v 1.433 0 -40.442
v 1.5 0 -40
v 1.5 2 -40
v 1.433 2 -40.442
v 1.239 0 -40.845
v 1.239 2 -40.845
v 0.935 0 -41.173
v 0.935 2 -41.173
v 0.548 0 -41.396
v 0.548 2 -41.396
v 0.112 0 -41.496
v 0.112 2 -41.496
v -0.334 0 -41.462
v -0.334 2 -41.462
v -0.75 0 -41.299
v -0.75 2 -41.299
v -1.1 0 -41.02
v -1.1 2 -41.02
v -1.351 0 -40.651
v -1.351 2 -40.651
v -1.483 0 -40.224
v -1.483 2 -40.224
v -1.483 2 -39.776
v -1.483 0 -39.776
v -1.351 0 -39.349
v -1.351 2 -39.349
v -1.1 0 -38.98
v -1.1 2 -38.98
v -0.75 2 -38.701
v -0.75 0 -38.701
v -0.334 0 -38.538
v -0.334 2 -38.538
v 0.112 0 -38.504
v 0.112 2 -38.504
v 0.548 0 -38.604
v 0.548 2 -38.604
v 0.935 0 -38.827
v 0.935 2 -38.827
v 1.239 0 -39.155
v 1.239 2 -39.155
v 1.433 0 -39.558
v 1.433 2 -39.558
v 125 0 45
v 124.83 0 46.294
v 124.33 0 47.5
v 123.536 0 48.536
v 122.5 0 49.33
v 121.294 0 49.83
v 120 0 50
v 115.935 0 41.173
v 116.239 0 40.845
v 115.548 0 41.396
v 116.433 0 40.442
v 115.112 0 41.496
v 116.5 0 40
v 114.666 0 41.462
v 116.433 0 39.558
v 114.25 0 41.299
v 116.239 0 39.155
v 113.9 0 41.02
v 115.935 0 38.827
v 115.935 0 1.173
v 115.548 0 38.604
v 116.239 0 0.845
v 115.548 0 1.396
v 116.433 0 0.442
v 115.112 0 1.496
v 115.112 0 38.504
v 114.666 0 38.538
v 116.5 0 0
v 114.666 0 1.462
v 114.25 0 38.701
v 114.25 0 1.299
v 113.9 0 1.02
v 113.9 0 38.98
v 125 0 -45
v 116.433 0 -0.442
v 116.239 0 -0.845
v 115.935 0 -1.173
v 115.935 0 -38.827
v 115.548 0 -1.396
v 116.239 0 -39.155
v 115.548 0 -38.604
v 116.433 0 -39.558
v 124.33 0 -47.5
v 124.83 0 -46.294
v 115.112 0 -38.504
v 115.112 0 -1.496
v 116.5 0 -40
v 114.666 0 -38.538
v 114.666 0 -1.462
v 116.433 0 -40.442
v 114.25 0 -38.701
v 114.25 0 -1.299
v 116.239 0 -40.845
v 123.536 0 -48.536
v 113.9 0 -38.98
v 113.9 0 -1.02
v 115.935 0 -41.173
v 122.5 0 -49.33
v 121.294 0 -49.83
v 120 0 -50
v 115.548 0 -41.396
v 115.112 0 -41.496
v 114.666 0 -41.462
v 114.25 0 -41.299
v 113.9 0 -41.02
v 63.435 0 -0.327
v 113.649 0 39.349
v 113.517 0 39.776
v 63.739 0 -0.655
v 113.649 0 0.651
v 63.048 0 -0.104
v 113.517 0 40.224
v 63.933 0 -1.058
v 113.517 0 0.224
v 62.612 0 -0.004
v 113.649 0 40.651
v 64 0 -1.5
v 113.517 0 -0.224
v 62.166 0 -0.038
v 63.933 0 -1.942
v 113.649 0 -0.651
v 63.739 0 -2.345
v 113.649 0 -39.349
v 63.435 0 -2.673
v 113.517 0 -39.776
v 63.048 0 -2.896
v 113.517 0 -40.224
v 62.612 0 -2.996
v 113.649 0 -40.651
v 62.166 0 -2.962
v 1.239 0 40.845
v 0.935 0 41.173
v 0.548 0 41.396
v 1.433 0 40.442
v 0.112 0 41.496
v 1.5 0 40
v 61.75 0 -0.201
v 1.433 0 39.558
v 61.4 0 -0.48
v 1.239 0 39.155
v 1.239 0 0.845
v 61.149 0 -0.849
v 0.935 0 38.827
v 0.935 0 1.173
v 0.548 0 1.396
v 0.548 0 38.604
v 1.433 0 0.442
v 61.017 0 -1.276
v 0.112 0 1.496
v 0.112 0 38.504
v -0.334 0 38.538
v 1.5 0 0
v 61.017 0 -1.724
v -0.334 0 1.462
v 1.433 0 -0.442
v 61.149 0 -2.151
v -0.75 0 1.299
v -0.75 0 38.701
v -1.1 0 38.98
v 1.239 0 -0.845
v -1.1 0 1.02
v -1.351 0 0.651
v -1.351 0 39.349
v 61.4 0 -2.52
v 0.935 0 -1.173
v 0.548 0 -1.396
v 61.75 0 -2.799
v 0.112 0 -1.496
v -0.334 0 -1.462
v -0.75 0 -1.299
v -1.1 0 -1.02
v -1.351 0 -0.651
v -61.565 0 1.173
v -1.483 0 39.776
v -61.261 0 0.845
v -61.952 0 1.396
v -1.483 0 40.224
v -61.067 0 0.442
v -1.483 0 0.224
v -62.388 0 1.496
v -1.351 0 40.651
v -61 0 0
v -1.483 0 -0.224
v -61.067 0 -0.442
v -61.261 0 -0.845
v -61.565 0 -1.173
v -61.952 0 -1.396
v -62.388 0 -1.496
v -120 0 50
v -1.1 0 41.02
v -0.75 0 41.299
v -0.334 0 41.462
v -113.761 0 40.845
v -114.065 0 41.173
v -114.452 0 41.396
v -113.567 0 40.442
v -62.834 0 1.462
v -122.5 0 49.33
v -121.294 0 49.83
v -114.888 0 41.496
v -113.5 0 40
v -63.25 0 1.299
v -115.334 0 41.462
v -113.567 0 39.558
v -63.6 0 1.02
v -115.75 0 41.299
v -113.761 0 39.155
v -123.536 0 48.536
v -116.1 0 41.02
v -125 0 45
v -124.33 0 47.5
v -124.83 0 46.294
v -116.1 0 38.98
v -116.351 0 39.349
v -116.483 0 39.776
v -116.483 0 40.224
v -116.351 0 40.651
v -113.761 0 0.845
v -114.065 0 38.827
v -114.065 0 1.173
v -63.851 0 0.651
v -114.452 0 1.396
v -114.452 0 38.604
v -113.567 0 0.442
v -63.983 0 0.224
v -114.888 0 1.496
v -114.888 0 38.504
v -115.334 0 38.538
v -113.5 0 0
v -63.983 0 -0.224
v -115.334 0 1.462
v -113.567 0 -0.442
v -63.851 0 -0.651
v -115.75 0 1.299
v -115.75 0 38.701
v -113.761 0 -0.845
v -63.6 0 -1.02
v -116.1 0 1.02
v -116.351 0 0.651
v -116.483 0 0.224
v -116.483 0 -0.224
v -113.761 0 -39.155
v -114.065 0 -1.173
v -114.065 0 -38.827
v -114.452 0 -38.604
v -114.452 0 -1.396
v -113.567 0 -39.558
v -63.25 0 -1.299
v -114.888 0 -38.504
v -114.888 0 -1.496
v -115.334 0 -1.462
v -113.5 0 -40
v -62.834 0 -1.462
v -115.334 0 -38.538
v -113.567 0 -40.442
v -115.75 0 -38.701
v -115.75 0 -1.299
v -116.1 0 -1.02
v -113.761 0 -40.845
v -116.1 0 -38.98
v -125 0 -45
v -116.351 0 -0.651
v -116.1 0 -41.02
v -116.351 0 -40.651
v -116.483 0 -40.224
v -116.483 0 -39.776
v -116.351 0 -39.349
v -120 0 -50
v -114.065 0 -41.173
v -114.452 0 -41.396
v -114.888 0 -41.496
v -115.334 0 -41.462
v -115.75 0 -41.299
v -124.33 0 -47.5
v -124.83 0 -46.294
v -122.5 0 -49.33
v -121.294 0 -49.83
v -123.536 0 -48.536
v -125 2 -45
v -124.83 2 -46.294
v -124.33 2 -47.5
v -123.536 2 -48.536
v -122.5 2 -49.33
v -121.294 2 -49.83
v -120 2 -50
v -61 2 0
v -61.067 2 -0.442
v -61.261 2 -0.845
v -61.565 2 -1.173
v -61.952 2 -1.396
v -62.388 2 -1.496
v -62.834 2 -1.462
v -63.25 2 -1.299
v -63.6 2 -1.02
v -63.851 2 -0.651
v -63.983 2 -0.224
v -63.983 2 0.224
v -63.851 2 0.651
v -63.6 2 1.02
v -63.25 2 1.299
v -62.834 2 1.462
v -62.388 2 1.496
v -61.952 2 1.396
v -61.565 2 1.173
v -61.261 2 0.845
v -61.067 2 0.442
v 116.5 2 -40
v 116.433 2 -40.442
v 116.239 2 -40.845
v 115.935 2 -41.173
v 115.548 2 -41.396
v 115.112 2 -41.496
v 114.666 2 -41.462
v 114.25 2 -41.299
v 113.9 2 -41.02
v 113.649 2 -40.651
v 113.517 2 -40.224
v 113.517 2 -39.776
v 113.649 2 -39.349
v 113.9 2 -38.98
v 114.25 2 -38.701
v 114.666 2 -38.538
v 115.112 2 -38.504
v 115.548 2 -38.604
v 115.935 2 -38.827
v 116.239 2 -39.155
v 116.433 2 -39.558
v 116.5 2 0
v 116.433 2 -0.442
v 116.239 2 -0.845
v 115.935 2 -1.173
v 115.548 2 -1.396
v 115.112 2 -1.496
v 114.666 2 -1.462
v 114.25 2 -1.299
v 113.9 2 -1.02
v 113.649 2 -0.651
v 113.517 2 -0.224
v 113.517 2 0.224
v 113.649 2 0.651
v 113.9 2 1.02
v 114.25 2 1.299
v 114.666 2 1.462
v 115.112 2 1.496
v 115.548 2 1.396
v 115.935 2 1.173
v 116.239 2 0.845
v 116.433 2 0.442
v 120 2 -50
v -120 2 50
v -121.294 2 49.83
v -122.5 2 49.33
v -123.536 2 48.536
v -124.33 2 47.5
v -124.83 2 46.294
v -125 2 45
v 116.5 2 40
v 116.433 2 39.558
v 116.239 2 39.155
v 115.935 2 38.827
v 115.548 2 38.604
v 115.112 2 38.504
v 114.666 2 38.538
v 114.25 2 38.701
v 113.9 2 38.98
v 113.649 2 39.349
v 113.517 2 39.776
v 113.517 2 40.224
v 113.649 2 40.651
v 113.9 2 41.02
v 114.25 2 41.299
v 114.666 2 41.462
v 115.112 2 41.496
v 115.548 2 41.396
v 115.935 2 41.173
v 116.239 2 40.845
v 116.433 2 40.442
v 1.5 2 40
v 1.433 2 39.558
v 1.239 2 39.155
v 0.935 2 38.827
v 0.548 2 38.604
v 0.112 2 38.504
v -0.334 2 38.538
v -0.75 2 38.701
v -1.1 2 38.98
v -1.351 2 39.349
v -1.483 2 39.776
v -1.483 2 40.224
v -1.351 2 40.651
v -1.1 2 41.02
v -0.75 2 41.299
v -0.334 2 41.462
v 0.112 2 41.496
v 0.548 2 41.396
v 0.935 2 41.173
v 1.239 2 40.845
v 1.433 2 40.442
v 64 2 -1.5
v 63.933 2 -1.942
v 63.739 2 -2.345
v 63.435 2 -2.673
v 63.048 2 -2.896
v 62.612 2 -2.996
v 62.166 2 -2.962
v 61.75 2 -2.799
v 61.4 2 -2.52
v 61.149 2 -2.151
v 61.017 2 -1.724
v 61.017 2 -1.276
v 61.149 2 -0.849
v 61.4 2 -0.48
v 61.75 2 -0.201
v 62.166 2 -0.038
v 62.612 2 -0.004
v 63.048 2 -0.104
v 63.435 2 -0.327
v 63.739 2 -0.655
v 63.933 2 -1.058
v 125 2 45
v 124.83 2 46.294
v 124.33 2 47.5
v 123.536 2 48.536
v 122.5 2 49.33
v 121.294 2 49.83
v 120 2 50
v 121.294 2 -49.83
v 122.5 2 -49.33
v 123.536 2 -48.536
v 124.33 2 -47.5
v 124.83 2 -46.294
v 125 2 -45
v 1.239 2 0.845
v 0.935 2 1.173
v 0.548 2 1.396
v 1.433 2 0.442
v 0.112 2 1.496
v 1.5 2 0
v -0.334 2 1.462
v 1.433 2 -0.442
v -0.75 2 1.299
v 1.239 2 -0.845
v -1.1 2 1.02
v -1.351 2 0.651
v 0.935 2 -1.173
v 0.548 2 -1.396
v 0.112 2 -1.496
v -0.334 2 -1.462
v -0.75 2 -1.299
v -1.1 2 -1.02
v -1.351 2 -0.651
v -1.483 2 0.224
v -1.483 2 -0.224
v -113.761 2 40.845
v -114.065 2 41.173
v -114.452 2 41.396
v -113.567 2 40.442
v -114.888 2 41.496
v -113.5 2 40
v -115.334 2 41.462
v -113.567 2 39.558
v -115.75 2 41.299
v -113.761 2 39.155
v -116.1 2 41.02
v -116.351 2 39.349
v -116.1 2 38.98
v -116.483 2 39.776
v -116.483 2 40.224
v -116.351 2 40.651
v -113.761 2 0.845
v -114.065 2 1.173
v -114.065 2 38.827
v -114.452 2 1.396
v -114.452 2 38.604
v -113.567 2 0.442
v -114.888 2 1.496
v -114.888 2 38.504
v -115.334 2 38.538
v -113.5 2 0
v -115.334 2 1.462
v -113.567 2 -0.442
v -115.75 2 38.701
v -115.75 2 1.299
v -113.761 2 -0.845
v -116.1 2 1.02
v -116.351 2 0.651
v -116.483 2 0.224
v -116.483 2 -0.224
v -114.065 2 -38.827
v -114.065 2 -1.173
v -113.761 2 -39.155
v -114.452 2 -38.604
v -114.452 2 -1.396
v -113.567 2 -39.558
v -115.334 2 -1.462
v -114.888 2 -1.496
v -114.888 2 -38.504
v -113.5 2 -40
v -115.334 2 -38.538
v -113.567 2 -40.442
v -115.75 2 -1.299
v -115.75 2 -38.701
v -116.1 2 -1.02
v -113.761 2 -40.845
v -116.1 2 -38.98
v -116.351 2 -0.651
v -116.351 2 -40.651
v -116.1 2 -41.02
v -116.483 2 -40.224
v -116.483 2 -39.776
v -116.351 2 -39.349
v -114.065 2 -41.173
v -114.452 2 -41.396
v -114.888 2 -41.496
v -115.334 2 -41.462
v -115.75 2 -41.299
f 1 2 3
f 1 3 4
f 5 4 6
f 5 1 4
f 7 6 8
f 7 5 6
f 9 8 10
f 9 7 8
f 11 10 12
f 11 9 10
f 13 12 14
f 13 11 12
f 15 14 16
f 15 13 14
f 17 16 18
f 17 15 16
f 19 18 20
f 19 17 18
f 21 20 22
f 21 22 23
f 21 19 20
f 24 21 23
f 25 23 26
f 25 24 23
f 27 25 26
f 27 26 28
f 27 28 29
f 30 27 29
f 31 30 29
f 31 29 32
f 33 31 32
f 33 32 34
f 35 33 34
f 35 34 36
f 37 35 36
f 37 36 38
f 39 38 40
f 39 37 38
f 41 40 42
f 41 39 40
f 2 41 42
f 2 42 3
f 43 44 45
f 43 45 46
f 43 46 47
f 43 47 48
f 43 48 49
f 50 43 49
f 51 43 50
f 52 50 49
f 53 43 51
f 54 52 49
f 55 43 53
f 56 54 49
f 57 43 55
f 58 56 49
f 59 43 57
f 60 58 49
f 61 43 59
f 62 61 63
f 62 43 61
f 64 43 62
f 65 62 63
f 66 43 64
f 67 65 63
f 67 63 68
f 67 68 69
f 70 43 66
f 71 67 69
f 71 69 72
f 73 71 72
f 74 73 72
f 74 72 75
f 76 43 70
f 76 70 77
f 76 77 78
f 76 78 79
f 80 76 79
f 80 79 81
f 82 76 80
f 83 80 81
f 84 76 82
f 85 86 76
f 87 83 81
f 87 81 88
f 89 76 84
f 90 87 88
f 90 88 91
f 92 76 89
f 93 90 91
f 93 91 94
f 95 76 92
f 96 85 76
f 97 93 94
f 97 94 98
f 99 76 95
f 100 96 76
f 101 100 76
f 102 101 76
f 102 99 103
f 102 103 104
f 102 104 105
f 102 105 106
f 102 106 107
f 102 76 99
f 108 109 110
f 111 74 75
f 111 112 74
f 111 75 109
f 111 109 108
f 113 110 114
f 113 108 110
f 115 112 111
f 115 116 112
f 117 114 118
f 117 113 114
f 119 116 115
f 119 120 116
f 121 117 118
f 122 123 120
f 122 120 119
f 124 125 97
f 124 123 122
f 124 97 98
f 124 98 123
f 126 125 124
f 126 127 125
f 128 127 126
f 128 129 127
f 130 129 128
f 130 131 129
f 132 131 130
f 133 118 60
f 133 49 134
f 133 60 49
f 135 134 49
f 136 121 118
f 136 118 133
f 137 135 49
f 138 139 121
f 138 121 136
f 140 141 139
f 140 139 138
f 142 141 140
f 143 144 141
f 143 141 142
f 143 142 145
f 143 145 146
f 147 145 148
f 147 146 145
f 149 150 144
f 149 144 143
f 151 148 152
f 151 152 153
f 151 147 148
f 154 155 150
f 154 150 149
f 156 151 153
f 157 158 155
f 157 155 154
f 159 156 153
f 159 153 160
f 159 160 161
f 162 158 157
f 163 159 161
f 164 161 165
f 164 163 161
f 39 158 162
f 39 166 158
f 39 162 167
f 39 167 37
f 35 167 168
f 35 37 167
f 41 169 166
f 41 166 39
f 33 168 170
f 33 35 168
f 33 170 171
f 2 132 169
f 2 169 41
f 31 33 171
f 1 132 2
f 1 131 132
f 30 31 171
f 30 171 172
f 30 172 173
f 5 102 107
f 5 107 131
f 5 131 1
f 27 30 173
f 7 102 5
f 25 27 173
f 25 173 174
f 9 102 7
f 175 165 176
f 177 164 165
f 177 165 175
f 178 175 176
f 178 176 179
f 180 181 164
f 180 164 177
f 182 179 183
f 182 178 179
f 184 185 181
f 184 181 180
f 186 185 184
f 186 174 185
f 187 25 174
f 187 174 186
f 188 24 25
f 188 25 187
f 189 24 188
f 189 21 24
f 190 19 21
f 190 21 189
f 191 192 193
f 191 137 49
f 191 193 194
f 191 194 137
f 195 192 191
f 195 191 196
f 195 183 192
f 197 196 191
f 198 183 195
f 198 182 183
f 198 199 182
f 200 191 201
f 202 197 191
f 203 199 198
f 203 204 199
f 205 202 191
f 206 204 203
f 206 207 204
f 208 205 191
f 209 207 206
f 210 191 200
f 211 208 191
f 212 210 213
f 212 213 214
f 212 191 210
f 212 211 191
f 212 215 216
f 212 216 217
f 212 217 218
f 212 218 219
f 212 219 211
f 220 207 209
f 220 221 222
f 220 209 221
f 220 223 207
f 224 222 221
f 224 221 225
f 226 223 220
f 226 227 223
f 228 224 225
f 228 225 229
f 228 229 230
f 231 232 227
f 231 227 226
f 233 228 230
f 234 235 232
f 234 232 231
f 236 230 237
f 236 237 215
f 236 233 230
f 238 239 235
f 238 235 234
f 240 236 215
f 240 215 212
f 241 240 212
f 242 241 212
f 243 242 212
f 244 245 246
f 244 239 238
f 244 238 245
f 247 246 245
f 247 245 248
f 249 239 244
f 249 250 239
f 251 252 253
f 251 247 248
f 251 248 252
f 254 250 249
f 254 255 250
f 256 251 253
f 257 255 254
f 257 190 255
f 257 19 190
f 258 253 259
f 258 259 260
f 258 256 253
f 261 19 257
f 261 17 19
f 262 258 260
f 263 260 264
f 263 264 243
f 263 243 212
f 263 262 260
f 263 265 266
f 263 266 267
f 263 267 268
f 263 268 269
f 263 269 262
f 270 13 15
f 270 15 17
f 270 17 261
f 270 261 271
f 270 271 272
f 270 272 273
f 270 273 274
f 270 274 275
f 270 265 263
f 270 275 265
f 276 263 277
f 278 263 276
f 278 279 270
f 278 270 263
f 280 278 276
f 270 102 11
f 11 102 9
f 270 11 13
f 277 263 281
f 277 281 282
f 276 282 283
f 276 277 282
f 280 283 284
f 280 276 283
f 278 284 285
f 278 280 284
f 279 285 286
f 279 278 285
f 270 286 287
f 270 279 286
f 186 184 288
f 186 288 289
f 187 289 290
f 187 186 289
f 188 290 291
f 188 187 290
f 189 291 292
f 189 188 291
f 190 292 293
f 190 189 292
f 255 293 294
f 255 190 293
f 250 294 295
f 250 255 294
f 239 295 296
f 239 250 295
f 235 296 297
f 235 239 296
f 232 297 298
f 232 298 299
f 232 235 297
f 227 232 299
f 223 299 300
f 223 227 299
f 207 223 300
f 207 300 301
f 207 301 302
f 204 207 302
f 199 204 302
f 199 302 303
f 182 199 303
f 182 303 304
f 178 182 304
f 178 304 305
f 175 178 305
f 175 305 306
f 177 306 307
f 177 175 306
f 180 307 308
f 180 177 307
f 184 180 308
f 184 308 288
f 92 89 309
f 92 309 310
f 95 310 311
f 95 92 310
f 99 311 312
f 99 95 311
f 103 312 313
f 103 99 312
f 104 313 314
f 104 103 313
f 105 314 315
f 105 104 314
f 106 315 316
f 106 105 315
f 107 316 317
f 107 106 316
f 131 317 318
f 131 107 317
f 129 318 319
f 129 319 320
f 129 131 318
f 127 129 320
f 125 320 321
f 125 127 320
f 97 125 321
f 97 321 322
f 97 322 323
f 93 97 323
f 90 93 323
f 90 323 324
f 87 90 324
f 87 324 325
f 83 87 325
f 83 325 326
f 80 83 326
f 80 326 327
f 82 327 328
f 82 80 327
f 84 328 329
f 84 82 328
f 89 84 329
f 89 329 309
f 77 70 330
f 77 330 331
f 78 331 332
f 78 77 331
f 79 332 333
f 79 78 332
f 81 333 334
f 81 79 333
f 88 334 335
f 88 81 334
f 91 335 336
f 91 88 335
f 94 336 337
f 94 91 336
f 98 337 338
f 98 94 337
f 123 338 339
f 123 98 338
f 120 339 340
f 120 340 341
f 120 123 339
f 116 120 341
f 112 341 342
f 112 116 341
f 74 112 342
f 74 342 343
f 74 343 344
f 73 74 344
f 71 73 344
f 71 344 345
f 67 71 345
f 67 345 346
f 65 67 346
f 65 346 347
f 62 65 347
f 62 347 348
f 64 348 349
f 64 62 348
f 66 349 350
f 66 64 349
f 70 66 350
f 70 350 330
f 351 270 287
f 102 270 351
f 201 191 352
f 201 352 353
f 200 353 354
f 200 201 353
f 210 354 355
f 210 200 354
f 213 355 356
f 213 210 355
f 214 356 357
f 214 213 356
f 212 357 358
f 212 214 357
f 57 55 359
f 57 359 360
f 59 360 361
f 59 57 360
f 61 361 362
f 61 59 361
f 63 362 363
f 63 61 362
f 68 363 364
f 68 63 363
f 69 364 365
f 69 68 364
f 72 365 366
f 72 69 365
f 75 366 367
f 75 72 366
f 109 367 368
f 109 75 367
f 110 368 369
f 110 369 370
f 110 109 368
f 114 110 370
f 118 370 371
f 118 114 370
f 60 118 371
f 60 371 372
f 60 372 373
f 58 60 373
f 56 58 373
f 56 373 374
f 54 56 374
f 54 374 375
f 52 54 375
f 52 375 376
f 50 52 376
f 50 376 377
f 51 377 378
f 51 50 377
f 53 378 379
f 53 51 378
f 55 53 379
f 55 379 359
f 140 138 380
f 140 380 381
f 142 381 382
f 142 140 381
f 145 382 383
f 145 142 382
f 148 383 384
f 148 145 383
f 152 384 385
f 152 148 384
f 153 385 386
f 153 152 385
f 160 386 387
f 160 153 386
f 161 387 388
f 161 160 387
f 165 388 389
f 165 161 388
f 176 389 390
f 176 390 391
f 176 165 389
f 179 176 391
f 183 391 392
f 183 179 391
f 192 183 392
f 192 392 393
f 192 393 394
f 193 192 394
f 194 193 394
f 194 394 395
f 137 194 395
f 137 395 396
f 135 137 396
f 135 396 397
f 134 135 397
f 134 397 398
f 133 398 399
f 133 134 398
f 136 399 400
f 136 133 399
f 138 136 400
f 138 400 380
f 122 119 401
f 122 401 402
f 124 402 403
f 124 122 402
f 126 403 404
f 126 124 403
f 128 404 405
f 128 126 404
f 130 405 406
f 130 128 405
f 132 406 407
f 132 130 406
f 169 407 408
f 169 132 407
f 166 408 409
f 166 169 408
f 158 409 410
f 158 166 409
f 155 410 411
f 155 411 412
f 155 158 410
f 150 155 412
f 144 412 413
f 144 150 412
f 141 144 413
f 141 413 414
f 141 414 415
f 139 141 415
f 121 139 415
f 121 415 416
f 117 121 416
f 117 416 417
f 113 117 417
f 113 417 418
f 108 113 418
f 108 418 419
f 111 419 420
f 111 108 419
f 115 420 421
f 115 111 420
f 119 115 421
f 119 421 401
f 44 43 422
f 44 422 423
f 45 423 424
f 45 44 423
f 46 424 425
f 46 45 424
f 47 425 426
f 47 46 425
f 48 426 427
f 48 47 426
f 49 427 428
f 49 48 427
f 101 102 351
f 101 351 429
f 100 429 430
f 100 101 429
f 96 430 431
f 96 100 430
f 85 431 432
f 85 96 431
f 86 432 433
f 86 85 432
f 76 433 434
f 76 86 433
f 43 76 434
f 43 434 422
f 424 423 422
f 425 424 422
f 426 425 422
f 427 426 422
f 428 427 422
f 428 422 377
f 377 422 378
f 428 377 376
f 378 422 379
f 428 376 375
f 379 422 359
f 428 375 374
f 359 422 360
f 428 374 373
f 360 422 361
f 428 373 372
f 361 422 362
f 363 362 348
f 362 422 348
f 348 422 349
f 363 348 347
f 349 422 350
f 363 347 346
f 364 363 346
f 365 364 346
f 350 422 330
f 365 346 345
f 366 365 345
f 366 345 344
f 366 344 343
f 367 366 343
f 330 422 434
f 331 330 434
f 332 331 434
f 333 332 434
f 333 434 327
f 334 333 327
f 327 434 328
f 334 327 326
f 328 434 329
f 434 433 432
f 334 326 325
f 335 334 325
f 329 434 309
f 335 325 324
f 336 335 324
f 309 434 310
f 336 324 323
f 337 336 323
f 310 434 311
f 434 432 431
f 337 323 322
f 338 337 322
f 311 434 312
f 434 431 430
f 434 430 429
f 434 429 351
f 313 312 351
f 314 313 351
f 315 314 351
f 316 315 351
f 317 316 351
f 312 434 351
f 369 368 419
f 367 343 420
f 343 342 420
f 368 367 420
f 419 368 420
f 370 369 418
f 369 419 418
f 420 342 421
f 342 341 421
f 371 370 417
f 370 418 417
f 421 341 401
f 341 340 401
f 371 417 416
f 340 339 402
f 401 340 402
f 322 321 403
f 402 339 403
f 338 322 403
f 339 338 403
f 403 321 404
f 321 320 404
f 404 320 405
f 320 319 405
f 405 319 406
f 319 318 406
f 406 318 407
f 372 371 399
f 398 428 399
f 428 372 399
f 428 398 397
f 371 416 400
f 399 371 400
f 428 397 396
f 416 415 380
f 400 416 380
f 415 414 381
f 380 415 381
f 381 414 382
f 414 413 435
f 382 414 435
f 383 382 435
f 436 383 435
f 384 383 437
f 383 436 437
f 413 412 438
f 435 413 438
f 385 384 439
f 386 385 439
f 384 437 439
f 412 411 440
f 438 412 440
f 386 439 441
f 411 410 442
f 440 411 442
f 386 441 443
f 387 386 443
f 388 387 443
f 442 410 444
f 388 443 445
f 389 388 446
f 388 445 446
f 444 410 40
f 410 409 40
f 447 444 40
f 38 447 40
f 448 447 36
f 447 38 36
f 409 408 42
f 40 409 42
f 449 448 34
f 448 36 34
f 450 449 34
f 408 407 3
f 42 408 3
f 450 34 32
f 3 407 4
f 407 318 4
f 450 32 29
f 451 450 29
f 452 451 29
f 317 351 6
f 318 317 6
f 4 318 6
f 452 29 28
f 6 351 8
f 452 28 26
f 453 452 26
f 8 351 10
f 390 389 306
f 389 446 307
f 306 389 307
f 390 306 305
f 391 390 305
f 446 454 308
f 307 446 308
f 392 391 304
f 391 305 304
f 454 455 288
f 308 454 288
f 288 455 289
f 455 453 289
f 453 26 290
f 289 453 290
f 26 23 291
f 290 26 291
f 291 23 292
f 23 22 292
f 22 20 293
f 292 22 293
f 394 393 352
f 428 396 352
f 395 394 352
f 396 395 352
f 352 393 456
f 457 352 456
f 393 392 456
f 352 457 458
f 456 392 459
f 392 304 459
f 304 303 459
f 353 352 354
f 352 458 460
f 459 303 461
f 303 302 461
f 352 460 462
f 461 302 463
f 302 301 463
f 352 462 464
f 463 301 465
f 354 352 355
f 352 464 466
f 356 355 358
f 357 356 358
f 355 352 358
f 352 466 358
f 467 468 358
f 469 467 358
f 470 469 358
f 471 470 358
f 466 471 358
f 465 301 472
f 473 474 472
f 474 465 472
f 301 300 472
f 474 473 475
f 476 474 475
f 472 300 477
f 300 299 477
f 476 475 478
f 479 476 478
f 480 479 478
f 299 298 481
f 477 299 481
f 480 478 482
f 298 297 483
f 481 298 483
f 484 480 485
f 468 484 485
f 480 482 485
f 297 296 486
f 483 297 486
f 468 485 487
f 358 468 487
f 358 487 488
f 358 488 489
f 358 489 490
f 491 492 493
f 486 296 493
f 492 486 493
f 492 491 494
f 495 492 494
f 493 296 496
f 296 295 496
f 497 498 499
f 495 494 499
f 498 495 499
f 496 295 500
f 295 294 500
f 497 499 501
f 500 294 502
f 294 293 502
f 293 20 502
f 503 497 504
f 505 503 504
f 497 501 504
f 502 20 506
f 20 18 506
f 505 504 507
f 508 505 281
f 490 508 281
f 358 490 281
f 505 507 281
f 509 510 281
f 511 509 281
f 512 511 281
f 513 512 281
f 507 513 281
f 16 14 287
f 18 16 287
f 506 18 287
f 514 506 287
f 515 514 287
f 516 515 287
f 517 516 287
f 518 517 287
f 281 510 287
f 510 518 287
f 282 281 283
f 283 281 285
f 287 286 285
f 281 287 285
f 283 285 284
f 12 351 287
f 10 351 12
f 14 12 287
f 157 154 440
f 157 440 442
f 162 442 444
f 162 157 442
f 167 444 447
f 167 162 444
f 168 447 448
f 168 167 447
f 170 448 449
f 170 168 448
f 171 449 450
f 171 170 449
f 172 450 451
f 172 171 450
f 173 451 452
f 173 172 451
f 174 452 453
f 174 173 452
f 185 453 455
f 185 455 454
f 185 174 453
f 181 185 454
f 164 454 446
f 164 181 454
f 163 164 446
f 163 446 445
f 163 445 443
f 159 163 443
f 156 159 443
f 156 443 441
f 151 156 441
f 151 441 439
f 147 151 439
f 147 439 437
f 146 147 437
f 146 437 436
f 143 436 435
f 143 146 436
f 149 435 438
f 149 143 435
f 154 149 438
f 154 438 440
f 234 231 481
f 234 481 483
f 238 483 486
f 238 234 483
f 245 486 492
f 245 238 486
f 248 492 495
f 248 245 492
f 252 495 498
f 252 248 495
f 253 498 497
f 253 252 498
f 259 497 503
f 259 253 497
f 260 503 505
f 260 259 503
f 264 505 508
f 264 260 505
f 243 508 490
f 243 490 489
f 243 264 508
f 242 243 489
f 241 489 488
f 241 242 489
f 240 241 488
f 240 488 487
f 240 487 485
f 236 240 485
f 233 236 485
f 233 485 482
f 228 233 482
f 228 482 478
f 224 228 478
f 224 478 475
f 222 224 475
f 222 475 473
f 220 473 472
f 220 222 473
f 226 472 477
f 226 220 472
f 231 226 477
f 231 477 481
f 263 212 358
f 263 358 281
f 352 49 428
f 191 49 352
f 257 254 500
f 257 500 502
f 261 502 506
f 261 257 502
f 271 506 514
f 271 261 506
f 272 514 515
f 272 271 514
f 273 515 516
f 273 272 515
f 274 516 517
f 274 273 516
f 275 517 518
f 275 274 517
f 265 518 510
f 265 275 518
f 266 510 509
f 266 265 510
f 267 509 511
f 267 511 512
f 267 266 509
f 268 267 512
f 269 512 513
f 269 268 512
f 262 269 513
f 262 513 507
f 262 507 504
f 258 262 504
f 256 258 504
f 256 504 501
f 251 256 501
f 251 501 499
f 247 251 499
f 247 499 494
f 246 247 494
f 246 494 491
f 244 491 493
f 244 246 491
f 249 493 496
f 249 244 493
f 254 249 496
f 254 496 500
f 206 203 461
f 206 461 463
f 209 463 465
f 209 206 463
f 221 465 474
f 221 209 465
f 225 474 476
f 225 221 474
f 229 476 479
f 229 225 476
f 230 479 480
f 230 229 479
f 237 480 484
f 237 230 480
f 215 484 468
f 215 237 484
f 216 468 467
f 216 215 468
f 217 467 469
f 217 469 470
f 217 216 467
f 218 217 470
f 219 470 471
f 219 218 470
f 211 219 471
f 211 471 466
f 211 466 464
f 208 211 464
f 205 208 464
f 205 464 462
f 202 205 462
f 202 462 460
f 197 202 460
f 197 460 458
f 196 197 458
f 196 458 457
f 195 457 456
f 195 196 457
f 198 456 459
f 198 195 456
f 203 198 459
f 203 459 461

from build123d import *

# Parameters (mm, degrees)
SKETCH1_R           = 1.5
BOSS_EXTRUDE1_DEPTH = 2


with BuildPart() as part:
    # Sketch1 → Boss-Extrude1 (new body)
    with BuildSketch(Plane(origin=(0, 0, 0), x_dir=(1, 0, 0), z_dir=(0, 1, 0))):
        with BuildLine():
            Line((-120, 50), (120, 50))
            ThreePointArc((120, 50), (123.535533906, 48.535533906), (125, 45))
            Line((125, 45), (125, -45))
            ThreePointArc((125, -45), (123.535533906, -48.535533906), (120, -50))
            Line((120, -50), (-120, -50))
            ThreePointArc((-120, -50), (-123.535533906, -48.535533906), (-125, -45))
            Line((-125, -45), (-125, 45))
            ThreePointArc((-125, 45), (-123.535533906, 48.535533906), (-120, 50))
        make_face()
        with Locations((0, 40)):
            Circle(SKETCH1_R, mode=Mode.SUBTRACT)
        with Locations((-115, 40)):
            Circle(SKETCH1_R, mode=Mode.SUBTRACT)
        with Locations((115, 40)):
            Circle(SKETCH1_R, mode=Mode.SUBTRACT)
        with Locations((-115, 0)):
            Circle(SKETCH1_R, mode=Mode.SUBTRACT)
        with Locations((-115, -40)):
            Circle(SKETCH1_R, mode=Mode.SUBTRACT)
        with Locations((0, -40)):
            Circle(SKETCH1_R, mode=Mode.SUBTRACT)
        with Locations((115, -40)):
            Circle(SKETCH1_R, mode=Mode.SUBTRACT)
        Circle(SKETCH1_R, mode=Mode.SUBTRACT)
        with Locations((115, 0)):
            Circle(SKETCH1_R, mode=Mode.SUBTRACT)
        with Locations((-62.5, 0)):
            Circle(SKETCH1_R, mode=Mode.SUBTRACT)
        with Locations((62.5, 1.5)):
            Circle(SKETCH1_R, mode=Mode.SUBTRACT)
    extrude(amount=BOSS_EXTRUDE1_DEPTH)


solid = part.part
